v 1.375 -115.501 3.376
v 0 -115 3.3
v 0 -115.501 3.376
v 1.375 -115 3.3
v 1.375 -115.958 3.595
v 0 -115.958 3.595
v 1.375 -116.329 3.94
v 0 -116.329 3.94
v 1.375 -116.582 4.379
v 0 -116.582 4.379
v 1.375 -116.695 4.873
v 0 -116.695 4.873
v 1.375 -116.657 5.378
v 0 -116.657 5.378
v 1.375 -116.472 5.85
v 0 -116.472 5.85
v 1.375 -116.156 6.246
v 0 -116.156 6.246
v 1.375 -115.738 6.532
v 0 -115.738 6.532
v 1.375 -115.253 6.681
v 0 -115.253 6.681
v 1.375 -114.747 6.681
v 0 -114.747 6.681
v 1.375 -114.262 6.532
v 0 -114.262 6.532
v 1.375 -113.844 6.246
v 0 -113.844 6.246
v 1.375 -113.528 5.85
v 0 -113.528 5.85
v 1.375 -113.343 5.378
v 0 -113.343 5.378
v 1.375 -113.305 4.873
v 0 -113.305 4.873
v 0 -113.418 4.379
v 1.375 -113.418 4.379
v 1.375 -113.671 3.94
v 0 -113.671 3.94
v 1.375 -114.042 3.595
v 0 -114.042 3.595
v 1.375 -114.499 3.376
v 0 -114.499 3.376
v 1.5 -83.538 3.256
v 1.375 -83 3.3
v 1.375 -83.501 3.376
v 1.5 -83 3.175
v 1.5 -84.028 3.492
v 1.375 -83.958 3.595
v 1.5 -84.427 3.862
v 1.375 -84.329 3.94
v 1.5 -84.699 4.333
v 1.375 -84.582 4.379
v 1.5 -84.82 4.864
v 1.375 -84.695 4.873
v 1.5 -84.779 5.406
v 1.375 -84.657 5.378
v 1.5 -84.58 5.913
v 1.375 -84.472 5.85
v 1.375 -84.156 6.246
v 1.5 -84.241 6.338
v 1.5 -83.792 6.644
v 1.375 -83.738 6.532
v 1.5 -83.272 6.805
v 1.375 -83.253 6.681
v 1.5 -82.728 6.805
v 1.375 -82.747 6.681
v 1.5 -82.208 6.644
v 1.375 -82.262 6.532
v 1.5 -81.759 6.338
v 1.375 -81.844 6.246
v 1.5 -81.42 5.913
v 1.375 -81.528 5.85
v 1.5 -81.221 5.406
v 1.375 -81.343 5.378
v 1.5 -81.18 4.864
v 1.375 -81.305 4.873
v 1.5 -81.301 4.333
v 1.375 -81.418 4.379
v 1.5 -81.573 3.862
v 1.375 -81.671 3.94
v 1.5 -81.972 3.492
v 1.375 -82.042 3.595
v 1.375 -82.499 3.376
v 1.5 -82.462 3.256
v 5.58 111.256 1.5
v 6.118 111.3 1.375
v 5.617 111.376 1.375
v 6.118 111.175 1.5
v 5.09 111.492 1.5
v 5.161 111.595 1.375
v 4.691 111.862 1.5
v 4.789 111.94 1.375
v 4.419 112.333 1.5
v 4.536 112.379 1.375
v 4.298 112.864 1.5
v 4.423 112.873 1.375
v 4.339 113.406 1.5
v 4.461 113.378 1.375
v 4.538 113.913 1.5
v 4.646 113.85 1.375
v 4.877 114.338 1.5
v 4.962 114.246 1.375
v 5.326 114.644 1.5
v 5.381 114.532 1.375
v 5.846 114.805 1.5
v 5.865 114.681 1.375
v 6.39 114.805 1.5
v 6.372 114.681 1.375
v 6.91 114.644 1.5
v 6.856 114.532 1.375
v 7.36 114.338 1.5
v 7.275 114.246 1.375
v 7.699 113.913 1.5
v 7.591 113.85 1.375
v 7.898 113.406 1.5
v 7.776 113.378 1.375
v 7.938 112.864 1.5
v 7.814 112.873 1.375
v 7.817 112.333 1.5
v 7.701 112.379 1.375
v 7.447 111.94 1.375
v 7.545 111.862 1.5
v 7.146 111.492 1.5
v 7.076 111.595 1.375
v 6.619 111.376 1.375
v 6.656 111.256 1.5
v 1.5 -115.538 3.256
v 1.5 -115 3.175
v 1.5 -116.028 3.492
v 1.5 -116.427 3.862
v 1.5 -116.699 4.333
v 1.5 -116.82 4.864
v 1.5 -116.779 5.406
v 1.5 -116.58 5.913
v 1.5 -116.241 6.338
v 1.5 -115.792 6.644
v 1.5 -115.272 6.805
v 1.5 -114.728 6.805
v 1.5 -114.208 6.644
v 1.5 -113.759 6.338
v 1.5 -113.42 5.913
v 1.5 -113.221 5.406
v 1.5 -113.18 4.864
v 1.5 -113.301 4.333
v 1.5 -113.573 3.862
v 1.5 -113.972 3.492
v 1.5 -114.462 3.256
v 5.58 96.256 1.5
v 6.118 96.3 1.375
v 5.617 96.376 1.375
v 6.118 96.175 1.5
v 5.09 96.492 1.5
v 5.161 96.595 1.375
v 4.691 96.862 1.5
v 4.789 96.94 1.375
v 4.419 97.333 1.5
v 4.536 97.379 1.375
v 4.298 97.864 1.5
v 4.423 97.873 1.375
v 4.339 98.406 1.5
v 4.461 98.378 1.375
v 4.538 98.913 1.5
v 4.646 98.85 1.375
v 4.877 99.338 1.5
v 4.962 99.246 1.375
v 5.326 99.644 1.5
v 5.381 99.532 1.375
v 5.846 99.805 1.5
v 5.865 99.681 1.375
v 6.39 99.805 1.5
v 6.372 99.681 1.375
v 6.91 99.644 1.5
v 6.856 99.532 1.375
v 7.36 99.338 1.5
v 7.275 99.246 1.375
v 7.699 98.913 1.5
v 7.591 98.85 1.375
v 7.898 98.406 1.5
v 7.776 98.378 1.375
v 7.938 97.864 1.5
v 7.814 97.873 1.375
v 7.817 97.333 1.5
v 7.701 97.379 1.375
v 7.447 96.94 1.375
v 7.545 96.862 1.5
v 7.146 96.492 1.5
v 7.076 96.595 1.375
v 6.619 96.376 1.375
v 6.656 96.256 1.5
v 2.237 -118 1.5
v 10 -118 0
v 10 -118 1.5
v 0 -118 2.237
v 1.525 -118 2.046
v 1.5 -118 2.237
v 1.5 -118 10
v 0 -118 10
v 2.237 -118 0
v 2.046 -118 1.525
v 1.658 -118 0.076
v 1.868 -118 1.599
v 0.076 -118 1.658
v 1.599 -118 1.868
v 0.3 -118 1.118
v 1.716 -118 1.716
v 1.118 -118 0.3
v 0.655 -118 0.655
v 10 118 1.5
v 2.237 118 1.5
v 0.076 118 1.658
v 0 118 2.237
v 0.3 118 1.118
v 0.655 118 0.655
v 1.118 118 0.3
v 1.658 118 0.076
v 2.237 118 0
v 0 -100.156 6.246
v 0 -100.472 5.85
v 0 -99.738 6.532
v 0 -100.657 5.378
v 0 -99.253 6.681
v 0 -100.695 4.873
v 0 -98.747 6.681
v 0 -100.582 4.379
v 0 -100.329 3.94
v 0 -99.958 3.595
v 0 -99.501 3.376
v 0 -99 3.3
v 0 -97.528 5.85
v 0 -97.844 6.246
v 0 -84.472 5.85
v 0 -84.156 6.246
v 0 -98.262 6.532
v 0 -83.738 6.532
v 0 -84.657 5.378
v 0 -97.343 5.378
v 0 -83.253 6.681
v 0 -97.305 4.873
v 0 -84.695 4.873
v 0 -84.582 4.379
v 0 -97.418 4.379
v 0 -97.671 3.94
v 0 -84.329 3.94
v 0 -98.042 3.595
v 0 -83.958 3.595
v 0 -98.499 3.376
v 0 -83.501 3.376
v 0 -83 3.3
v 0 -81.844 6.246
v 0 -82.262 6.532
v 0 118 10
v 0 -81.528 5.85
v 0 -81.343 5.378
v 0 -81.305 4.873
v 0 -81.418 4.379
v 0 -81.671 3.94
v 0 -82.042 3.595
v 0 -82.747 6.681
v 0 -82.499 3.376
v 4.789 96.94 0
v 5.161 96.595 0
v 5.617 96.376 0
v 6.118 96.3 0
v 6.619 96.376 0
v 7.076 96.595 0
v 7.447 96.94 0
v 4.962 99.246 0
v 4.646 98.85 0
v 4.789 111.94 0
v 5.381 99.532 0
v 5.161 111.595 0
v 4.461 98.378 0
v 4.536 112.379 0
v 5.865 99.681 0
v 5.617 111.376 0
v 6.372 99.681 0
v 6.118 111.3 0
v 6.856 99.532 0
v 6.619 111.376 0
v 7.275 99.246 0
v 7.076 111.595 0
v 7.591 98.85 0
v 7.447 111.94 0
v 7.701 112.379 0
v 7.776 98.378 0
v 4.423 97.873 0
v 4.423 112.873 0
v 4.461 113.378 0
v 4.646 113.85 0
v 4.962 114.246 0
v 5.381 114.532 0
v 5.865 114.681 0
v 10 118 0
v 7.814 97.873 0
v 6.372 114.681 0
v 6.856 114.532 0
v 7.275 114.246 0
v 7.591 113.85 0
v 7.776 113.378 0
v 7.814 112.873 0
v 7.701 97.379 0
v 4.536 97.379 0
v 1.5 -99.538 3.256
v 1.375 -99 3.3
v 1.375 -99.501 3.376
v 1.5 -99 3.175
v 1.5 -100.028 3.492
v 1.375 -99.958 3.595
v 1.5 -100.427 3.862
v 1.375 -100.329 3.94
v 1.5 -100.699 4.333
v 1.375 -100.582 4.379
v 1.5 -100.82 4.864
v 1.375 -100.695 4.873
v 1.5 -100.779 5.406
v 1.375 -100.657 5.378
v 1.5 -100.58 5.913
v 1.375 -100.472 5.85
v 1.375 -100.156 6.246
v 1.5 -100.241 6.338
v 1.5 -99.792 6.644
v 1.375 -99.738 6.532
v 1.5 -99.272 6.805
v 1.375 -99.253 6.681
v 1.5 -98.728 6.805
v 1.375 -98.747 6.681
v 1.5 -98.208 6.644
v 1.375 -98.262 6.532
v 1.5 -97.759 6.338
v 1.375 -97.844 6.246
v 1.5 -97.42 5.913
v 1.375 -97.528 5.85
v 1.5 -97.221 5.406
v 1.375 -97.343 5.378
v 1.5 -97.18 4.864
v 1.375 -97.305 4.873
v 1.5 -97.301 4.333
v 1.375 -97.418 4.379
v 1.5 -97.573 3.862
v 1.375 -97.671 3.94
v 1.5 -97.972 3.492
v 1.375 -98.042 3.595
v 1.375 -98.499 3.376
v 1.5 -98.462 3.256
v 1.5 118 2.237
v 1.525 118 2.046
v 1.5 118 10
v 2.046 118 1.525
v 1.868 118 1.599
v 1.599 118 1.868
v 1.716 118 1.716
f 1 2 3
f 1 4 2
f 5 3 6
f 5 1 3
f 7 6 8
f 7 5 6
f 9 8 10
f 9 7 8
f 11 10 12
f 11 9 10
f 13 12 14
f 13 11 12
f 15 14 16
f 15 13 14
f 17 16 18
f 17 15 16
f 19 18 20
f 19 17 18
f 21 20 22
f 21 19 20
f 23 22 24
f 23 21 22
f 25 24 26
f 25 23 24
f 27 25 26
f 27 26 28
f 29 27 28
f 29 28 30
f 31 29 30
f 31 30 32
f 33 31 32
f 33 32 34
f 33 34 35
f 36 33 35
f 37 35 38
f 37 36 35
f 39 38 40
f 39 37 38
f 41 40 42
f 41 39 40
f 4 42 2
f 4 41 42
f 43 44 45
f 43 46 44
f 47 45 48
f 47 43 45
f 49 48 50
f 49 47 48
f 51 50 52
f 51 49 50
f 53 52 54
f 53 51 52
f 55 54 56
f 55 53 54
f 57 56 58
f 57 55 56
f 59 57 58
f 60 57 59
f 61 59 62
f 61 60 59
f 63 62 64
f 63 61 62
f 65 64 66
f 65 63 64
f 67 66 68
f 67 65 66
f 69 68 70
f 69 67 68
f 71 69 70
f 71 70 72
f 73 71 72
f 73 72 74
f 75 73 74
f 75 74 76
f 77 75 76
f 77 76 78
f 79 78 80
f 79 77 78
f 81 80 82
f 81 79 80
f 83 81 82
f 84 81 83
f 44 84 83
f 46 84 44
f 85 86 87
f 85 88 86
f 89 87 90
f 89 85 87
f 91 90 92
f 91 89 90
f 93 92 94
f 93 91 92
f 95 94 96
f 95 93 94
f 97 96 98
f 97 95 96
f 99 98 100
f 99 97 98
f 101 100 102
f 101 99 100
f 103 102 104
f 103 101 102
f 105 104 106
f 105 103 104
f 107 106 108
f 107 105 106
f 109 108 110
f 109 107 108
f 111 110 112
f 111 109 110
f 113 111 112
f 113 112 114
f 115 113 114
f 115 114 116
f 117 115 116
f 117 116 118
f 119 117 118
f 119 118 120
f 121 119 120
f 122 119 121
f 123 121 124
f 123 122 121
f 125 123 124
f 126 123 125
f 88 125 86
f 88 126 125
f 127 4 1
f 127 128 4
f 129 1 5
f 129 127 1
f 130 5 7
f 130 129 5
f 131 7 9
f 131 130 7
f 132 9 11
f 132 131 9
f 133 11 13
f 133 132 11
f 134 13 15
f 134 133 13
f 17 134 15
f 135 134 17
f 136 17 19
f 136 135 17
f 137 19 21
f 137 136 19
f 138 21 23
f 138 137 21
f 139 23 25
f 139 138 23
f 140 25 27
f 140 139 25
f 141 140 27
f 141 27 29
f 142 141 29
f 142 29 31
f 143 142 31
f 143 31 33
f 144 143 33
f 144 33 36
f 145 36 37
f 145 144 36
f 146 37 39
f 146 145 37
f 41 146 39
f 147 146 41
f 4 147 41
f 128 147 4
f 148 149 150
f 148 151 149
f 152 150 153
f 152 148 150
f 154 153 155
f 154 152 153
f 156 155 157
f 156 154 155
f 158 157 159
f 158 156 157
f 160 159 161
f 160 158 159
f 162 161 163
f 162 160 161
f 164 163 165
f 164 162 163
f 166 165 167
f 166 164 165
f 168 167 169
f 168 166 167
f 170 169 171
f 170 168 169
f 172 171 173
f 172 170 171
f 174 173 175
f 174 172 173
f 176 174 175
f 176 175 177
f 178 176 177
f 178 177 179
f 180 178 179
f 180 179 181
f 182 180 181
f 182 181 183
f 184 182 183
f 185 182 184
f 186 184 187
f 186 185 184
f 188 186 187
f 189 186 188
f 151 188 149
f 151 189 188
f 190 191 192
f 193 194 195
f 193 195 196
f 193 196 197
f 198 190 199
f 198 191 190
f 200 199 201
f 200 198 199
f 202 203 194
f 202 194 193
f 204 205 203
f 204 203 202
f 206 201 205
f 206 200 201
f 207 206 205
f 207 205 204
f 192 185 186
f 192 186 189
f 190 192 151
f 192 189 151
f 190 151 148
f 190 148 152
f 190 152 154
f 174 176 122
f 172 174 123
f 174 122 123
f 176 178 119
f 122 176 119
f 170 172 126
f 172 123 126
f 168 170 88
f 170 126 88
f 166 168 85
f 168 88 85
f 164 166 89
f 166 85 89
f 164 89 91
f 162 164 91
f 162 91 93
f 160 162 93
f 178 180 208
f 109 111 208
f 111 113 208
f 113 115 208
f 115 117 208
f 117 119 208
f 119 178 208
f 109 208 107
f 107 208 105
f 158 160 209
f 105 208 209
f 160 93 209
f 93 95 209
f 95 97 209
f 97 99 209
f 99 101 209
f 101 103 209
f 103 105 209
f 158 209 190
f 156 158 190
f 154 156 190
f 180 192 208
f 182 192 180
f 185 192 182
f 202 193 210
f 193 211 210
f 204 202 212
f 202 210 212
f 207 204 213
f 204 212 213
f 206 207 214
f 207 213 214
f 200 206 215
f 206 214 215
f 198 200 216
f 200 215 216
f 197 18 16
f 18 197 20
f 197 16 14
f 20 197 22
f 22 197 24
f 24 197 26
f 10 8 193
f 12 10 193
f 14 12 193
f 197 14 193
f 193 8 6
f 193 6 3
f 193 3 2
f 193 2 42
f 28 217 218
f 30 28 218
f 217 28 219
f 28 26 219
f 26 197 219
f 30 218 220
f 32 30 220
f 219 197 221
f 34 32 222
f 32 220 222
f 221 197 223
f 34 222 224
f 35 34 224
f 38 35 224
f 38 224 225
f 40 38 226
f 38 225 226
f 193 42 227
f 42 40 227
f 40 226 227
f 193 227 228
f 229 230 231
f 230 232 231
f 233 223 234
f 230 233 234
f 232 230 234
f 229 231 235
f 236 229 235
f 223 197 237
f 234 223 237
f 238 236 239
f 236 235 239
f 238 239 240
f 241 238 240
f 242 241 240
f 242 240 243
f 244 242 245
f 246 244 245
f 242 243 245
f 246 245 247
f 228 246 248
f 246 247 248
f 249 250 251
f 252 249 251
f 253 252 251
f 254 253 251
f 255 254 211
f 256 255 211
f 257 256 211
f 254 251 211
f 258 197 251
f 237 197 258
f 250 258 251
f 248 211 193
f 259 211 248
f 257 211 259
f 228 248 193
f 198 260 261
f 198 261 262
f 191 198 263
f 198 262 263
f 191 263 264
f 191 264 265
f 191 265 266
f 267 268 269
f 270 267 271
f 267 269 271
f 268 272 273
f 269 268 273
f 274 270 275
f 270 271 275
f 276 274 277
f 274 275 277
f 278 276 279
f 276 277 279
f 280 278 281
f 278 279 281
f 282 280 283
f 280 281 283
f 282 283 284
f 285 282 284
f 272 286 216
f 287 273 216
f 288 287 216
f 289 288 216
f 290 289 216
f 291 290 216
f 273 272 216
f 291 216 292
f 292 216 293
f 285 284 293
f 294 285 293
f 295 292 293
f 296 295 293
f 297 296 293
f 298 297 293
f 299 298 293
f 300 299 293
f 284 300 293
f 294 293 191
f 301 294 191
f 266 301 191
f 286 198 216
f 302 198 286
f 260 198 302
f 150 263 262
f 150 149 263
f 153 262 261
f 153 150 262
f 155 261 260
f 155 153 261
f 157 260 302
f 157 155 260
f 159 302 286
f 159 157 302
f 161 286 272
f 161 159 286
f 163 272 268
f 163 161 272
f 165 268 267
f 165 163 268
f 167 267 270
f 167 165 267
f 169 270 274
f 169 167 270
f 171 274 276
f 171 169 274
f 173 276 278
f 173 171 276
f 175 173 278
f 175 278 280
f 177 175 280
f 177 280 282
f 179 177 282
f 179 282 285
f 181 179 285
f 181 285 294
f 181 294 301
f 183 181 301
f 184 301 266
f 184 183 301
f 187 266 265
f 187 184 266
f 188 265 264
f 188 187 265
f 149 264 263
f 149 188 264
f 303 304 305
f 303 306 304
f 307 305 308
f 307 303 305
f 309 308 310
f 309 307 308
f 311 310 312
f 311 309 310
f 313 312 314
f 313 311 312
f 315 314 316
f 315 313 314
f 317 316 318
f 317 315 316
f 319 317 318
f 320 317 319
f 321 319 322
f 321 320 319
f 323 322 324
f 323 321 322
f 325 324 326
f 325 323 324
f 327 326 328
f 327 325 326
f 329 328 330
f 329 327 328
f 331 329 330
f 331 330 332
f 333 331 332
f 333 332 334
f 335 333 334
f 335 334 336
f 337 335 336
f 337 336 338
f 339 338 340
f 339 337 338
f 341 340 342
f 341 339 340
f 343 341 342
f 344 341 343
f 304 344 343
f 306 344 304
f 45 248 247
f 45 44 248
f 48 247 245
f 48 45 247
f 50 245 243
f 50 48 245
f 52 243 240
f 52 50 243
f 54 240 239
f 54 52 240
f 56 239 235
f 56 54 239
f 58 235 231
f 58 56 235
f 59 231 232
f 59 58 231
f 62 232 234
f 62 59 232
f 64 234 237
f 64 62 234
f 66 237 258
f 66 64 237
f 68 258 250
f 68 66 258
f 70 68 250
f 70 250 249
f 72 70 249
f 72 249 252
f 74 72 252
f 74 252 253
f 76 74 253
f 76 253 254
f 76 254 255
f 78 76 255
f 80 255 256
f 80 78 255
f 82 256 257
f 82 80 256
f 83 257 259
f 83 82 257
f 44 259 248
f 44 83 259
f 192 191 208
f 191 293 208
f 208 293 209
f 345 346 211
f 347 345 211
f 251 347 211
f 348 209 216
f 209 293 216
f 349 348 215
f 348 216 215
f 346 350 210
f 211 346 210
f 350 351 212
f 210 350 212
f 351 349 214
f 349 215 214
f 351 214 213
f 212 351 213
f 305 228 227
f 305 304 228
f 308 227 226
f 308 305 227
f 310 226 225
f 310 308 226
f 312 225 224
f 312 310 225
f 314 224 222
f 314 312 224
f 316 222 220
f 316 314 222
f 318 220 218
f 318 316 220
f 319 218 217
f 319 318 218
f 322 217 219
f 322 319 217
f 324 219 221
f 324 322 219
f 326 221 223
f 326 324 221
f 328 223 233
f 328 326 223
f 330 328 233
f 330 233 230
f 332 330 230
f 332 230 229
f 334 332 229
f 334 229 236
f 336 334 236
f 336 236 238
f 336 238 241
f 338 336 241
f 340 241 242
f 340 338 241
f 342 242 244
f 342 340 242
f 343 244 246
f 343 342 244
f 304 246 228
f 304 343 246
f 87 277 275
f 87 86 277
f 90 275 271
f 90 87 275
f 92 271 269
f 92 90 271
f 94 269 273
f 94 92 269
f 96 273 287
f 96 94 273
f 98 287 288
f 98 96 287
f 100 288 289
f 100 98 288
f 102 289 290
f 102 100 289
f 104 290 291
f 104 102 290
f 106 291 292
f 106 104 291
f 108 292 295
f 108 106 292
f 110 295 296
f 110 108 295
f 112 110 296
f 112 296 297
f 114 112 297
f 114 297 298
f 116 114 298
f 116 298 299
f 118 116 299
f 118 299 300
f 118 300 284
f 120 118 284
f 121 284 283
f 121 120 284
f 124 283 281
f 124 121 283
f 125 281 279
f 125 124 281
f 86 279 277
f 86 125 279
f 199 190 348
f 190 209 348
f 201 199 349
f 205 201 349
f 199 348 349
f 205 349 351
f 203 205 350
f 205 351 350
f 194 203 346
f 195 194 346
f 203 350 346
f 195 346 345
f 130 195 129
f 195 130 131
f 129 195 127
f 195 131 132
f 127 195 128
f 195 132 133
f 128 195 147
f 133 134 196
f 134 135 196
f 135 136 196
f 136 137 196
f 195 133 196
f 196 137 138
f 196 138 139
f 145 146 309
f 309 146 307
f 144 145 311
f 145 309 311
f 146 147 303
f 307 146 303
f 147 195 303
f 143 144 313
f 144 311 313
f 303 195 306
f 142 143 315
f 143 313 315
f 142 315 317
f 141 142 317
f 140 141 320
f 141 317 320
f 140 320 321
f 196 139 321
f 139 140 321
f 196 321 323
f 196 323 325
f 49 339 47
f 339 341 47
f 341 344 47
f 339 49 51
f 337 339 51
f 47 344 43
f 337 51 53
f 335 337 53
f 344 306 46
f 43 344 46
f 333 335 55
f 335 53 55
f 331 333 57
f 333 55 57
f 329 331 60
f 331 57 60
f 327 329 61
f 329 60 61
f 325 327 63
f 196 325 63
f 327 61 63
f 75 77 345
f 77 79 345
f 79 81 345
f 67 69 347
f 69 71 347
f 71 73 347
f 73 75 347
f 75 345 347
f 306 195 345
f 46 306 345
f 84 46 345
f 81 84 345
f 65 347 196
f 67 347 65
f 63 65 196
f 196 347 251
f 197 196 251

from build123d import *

# Parameters (mm, degrees)
BASE_FLANGE1_DEPTH            = 118
M3_CLEARANCE_HOLE1_AT_2_COUNT = 2
M3_CLEARANCE_HOLE1_AT_2_PITCH = 15
M3_CLEARANCE_HOLE2_AT_2_COUNT = 2
M3_CLEARANCE_HOLE2_AT_2_PITCH = 16
M3_CLEARANCE_HOLE2_AT_3_COUNT = 2
M3_CLEARANCE_HOLE2_AT_3_PITCH = 32


# Sheet-metal steps are written as plain solids
with BuildPart() as part:
    # Sketch1 → Base-Flange1 (new, symmetric)
    with BuildSketch(Plane(origin=(0, 0, 0), x_dir=(1, 0, 0), z_dir=(0, 1, 0))):
        with BuildLine():
            Line((0, -10), (0, -2.2366))
            ThreePointArc((0, -2.2366), (0.655084973, -0.655084973), (2.2366, 0))
            Line((2.2366, 0), (10, 0))
            Line((10, 0), (10, -1.5))
            Line((10, -1.5), (2.2366, -1.5))
            ThreePointArc((2.2366, -1.5), (1.715745145, -1.715745145), (1.5, -2.2366))
            Line((1.5, -2.2366), (1.5, -10))
            Line((1.5, -10), (0, -10))
        make_face()
    extrude(amount=BASE_FLANGE1_DEPTH, both=True)

    # Sketch9 → M3 Clearance Hole1 (revolve, cut)
    with BuildSketch(Plane(origin=(6.1183, 113, 1.5), x_dir=(0, -1, 0), z_dir=(1, 0, 0))):
        Polygon((0, 0), (0, 1.5), (1.7, 1.5), (1.7, 0.125), (1.825, 0), align=None)
    m3_clearance_hole1 = revolve(axis=Axis((6.1183, 113, 7.85), (0, 0, -1)), mode=Mode.SUBTRACT)

    # M3 Clearance Hole1 at 2: M3 Clearance Hole1 ×2
    with Locations(*[(0, -i * M3_CLEARANCE_HOLE1_AT_2_PITCH, 0) for i in range(1, M3_CLEARANCE_HOLE1_AT_2_COUNT)]):
        add(m3_clearance_hole1, mode=Mode.SUBTRACT)

    # Sketch12 → M3 Clearance Hole2 (revolve, cut)
    with BuildSketch(Plane(origin=(1.5, -115, 5), x_dir=(0, 0, -1), z_dir=(0, 1, 0))):
        Polygon((0, 0), (0, 1.5), (1.7, 1.5), (1.7, 0.125), (1.825, 0), align=None)
    m3_clearance_hole2 = revolve(axis=Axis((7.85, -115, 5), (-1, 0, 0)), mode=Mode.SUBTRACT)

    # M3 Clearance Hole2 at 2: M3 Clearance Hole2 ×2
    with Locations(*[(0, i * M3_CLEARANCE_HOLE2_AT_2_PITCH, 0) for i in range(1, M3_CLEARANCE_HOLE2_AT_2_COUNT)]):
        add(m3_clearance_hole2, mode=Mode.SUBTRACT)

    # M3 Clearance Hole2 at 3: M3 Clearance Hole2 ×2
    with Locations(*[(0, i * M3_CLEARANCE_HOLE2_AT_3_PITCH, 0) for i in range(1, M3_CLEARANCE_HOLE2_AT_3_COUNT)]):
        add(m3_clearance_hole2, mode=Mode.SUBTRACT)


solid = part.part
